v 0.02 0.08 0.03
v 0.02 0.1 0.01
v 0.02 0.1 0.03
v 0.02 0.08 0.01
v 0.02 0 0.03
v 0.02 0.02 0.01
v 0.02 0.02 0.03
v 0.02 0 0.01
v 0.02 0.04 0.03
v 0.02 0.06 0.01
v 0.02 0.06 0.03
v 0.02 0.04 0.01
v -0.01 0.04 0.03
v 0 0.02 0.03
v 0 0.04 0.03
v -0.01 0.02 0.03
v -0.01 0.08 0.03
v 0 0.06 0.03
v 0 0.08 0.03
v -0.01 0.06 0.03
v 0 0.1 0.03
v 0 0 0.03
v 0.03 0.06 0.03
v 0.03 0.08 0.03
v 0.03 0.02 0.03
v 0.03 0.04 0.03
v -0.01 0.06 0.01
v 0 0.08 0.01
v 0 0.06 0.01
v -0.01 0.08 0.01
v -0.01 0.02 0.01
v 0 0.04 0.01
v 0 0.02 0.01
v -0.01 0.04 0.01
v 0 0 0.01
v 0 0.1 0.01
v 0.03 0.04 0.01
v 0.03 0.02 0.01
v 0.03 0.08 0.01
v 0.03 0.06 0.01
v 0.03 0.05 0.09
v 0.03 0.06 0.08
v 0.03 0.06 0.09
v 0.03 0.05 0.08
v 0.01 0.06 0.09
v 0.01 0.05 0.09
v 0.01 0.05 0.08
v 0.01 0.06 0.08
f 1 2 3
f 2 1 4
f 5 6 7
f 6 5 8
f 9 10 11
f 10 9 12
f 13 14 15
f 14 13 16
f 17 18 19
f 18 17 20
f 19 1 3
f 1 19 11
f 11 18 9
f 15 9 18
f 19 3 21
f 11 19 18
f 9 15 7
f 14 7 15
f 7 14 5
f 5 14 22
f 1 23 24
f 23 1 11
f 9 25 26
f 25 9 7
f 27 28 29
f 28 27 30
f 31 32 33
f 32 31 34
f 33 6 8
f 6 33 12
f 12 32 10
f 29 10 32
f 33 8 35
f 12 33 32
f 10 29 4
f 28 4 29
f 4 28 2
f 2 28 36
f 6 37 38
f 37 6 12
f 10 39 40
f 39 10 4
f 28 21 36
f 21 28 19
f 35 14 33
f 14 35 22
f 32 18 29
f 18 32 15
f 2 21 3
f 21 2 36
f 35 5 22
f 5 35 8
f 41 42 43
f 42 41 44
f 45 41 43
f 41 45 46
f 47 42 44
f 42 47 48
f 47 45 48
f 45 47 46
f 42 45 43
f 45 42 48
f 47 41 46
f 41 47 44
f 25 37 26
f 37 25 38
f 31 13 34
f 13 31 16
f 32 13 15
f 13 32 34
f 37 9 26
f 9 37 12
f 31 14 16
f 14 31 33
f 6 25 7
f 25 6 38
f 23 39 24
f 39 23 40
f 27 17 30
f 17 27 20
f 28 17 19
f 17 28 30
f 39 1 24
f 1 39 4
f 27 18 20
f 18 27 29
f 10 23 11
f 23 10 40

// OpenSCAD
module mounting_bracket() {
    // Base plate
    difference() {
        scale([0.2, 0.1, 0.01])
            cylinder(h=1, r=0.5, $fn=64);
        translate([-0.1, -0.05, 0])
            cube([0.2, 0.1, 0.01]);
    }

    // Central rib
    translate([0, 0, 0.01])
        cube([0.02, 0.1, 0.02]);

    // Hook-shaped arm
    translate([0.01, 0, 0.03])
    rotate([0, 90, 0])
        difference() {
            scale([0.05, 0.05, 0.05])
                cylinder(h=1, r=0.5, $fn=64);
            translate([-0.5, -0.5, 0])
                cube([1, 1, 0.5]);
        }

    // Rectangular tip
    translate([0.01, 0.05, 0.08])
        cube([0.02, 0.01, 0.01]);

    // Blocky bosses/steps
    translate([-0.01, 0.02, 0.01])
        cube([0.04, 0.02, 0.02]);
    translate([-0.01, 0.06, 0.01])
        cube([0.04, 0.02, 0.02]);
}

mounting_bracket();
